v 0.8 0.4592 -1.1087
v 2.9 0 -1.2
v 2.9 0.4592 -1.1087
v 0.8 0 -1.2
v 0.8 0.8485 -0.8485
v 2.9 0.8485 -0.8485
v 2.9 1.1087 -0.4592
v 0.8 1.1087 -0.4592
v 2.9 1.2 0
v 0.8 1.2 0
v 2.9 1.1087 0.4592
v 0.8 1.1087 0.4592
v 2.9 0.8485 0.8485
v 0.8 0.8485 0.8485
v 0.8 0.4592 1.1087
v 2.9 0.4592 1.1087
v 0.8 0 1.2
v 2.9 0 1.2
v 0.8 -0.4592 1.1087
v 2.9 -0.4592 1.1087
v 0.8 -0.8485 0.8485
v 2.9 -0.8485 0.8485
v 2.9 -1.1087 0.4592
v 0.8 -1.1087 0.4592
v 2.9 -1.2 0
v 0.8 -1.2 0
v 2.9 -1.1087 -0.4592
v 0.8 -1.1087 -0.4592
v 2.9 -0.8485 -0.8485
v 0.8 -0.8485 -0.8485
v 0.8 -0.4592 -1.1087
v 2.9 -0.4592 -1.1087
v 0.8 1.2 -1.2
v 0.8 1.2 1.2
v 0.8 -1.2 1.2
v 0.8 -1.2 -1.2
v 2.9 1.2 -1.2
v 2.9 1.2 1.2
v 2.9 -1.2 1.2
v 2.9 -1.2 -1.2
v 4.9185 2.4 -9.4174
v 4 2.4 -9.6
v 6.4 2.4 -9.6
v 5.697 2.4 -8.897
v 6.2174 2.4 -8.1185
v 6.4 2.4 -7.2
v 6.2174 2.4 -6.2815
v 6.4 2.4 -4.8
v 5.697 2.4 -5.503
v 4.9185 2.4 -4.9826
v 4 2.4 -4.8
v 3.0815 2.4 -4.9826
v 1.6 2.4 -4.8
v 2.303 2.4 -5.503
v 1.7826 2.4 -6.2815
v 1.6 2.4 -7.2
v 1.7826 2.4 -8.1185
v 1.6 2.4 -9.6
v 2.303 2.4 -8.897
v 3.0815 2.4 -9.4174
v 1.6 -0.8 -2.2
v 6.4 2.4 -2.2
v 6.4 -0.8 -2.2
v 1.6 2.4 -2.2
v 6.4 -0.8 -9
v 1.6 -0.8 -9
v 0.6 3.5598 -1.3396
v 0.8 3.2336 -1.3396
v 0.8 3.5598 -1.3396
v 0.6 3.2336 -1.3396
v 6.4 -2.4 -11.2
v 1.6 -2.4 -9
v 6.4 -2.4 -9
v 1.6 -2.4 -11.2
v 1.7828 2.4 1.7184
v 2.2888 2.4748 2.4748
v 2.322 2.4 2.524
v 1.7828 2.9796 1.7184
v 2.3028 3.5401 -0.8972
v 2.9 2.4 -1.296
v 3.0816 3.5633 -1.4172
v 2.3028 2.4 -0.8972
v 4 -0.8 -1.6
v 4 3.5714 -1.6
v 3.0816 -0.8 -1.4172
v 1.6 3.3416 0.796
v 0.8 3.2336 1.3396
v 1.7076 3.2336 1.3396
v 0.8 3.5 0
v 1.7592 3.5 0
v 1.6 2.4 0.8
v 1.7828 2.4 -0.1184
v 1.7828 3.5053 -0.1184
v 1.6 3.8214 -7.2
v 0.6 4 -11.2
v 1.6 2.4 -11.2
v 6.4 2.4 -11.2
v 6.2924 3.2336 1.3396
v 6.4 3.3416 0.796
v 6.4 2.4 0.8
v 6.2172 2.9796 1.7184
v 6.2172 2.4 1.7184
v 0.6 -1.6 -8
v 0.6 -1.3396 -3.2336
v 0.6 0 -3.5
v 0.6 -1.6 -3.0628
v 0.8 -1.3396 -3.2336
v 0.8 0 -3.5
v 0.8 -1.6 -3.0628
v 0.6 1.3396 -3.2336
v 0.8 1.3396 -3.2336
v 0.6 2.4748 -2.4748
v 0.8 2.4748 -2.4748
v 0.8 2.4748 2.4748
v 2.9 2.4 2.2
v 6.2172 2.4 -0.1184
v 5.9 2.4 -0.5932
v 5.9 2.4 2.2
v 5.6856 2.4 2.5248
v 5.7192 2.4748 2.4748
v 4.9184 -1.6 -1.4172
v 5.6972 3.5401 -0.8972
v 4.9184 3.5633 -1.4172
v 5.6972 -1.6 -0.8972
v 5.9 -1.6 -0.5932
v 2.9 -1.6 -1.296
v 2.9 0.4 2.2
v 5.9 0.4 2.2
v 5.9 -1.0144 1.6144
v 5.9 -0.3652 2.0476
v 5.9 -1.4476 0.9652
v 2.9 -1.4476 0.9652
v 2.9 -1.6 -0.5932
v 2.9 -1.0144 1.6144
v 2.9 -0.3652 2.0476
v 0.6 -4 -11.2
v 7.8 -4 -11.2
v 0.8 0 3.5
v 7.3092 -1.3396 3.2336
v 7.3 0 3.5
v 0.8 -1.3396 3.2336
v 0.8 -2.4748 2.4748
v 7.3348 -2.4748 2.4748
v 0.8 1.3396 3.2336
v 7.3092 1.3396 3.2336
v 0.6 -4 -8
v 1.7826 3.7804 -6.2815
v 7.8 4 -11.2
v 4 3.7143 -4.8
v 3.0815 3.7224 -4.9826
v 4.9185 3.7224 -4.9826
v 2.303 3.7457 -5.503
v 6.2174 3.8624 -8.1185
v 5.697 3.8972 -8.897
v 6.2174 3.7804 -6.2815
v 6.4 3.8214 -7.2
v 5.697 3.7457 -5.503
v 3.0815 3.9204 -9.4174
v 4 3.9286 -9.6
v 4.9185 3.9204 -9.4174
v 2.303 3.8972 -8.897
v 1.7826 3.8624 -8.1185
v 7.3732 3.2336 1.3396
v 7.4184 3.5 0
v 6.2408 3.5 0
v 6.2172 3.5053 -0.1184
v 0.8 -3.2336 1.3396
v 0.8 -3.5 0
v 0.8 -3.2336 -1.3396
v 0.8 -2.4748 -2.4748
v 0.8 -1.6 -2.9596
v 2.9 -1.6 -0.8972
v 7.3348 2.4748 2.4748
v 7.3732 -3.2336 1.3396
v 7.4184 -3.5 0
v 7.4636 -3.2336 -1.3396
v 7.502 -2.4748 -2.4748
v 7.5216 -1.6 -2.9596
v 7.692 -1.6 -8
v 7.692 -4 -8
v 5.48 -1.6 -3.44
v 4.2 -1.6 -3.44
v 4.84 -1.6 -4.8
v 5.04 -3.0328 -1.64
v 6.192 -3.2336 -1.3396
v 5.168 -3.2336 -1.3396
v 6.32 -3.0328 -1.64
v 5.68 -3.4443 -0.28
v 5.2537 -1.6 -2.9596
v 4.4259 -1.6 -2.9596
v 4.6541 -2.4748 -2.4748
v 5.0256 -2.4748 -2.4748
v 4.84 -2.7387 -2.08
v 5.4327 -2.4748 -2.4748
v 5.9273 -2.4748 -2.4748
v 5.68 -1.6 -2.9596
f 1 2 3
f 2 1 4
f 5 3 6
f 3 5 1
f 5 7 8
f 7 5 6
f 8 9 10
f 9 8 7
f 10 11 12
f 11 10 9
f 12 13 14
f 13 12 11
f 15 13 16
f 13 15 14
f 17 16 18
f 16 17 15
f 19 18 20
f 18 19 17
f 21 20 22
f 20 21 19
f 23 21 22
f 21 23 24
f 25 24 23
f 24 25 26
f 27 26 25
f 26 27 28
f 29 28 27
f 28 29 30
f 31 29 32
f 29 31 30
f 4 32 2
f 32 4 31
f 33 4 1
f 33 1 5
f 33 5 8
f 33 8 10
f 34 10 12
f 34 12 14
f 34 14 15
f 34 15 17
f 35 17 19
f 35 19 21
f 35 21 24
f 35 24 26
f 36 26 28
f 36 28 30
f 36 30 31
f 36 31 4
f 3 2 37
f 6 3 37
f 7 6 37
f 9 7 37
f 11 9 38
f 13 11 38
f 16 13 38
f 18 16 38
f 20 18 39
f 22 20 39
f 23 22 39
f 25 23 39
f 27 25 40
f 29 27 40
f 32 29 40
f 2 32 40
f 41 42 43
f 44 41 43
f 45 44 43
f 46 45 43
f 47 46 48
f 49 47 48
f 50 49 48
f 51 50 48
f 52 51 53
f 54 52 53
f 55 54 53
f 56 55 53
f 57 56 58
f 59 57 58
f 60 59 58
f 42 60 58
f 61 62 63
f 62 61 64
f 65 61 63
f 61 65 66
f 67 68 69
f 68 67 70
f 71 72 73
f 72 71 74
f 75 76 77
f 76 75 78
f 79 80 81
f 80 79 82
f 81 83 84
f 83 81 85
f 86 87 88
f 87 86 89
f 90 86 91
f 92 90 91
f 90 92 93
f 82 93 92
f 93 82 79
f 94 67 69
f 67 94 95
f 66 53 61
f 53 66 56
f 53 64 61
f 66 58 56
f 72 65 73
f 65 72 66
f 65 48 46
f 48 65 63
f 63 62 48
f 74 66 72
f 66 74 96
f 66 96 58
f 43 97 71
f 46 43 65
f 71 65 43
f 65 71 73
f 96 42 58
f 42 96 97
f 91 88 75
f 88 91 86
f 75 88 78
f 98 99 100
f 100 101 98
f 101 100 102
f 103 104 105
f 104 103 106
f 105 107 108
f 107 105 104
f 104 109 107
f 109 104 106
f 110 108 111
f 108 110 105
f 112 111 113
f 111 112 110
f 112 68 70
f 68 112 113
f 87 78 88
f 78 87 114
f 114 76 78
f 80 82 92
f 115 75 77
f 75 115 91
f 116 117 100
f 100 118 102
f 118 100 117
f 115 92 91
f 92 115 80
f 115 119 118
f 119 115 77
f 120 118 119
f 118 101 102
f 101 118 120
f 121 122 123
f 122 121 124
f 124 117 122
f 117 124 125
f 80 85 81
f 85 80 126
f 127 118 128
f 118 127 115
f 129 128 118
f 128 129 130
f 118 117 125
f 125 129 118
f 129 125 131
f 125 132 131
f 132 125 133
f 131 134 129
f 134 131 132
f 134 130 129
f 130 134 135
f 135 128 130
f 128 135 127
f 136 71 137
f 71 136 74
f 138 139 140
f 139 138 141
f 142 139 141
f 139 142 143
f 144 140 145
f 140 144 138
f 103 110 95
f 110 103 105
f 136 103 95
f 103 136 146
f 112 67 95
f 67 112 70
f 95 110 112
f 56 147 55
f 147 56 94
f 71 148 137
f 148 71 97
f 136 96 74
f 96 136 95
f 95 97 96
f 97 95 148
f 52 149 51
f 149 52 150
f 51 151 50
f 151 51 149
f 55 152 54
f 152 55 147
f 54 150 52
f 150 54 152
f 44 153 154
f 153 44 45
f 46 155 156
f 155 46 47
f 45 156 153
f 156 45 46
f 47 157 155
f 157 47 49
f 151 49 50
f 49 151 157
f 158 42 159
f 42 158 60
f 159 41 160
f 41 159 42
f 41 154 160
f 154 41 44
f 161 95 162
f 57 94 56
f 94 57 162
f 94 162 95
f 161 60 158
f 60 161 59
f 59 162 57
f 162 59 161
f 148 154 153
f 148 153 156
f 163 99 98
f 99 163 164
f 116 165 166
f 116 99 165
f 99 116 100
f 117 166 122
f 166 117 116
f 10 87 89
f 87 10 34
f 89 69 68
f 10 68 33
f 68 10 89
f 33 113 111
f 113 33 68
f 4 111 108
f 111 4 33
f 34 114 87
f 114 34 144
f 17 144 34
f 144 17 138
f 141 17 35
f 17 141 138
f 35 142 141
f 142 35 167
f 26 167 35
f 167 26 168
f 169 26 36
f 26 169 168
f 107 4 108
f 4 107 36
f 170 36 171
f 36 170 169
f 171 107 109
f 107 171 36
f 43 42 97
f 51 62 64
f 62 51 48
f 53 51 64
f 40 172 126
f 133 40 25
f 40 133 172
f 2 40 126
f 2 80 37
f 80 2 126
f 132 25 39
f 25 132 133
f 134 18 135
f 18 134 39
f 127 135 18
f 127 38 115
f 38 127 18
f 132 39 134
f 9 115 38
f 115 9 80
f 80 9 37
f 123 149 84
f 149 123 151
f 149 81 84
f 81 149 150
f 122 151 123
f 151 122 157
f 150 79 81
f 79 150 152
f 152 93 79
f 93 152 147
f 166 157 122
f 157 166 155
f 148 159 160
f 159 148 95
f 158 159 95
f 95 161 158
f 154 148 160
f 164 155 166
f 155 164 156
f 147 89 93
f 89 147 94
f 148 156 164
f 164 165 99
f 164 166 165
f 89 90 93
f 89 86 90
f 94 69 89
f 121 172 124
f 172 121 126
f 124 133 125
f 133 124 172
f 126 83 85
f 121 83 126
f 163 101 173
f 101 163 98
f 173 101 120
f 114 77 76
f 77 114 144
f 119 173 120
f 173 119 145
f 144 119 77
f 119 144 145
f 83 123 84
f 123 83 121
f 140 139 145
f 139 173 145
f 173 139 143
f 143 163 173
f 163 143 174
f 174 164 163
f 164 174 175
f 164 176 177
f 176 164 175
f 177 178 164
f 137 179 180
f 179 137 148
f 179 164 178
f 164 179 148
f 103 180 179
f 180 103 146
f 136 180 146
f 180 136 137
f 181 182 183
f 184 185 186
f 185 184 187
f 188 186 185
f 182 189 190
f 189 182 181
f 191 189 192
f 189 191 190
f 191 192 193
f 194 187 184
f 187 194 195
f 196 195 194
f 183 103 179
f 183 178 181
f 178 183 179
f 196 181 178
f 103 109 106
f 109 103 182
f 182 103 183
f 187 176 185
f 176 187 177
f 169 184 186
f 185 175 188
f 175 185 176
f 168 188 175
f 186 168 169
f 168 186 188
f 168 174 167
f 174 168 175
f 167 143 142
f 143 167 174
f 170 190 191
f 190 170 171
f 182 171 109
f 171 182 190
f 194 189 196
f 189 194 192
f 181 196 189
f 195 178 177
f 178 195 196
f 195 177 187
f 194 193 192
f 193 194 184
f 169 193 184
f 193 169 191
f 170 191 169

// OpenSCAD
use <../lib.scad>
use <s/3817bs01.scad>
function ldraw_lib__3817bpba() = [
// 0 ~Minifig Leg Left with  2 Red Diamonds Pattern (Obsolete)
// 0 Name: 3817bpba.dat
// 0 Author: Magnus Forsberg [MagFors]
// 0 !LDRAW_ORG Part UPDATE 2023-03
// 0 !LICENSE Licensed under CC BY 4.0 : see CAreadme.txt
// 
// 0 !HELP Move down 12 units to align with hips
// 
// 0 BFC CERTIFY CCW
  [0,"BFC","CERTIFY"],
  [0,"BFC","CCW"],
// 
// 0 !CATEGORY Obsolete
// 0 !KEYWORDS 2006, Batman, bricklink 970d03pb01, Harley Quinn, set 7886
// 
// 0 !HISTORY 2013-12-23 [MagFors] Original design as 3817pba
// 0 !HISTORY 2020-06-14 [MagFors] Adapted to corrected geometry
// 0 !HISTORY 2020-12-29 [PTadmin] Official Update 2020-03
// 0 !HISTORY 2023-05-29 [Holly-Wood] Obsoleted due to bad geometry
// 0 !HISTORY 2023-06-24 [OrionP] Official Update 2023-03
// 
// 
// 1 16 0 0 0 1 0 0 0 1 0 0 0 1 s\3817bs01.dat
  [1,16,0,0,0,1,0,0,0,1,0,0,0,1, ldraw_lib__s__3817bs01()],
// 4 16 1.5 20 -4 1.5 20 -10 19.23 20 -10 19.23 20 -4
  [4,16,1.5,20,-4,1.5,20,-10,19.23,20,-10,19.23,20,-4],
// 4 16 1.5 20 -10 1.5 28 -10 19.5 28 -10 19.23 20 -10
  [4,16,1.5,20,-10,1.5,28,-10,19.5,28,-10,19.23,20,-10],
// 5 24 2 3.349 -8.084 18.659 3.349 -8.084 2 0 -8.75 2 6.187 -6.187
  [5,24,2,3.349,-8.084,18.659,3.349,-8.084,2,0,-8.75,2,6.187,-6.187],
// 5 24 2 6.187 -6.187 18.755 6.187 -6.187 2 7.399 -4 2 3.349 -8.084
  [5,24,2,6.187,-6.187,18.755,6.187,-6.187,2,7.399,-4,2,3.349,-8.084],
// 5 24 2 0 -8.75 18.546 0 -8.75 2 3.349 -8.084 2 -3.349 -8.084
  [5,24,2,0,-8.75,18.546,0,-8.75,2,3.349,-8.084,2,-3.349,-8.084],
// 5 24 2 -3.349 -8.084 18.433 -3.349 -8.084 2 0 -8.75 2 -6.187 -6.187
  [5,24,2,-3.349,-8.084,18.433,-3.349,-8.084,2,0,-8.75,2,-6.187,-6.187],
// 
// 0 // pattern
// 3 4 13.7 8.6 -4 10.5 8.6 -4 12.1 12 -4
  [3,4,13.7,8.6,-4,10.5,8.6,-4,12.1,12,-4],
// 4 4 12.92 3.349 -8.084 12.6 4.1 -7.582 15.8 4.1 -7.582 15.48 3.349 -8.084
  [4,4,12.92,3.349,-8.084,12.6,4.1,-7.582,15.8,4.1,-7.582,15.48,3.349,-8.084],
// 3 4 14.2 0.7 -8.6108 12.92 3.349 -8.084 15.48 3.349 -8.084
  [3,4,14.2,0.7,-8.6108,12.92,3.349,-8.084,15.48,3.349,-8.084],
// 4 4 10.5 8.6 -4 13.7 8.6 -4 13.1343 7.399 -4 11.0647 7.399 -4
  [4,4,10.5,8.6,-4,13.7,8.6,-4,13.1343,7.399,-4,11.0647,7.399,-4],
// 4 4 12.564 6.187 -6.187 11.6353 6.187 -6.187 11.0647 7.399 -4 13.1343 7.399 -4
  [4,4,12.564,6.187,-6.187,11.6353,6.187,-6.187,11.0647,7.399,-4,13.1343,7.399,-4],
// 3 4 11.6353 6.187 -6.187 12.564 6.187 -6.187 12.1 5.2 -6.8467
  [3,4,11.6353,6.187,-6.187,12.564,6.187,-6.187,12.1,5.2,-6.8467],
// 4 4 12.6 4.1 -7.582 13.5818 6.187 -6.187 14.8182 6.187 -6.187 15.8 4.1 -7.582
  [4,4,12.6,4.1,-7.582,13.5818,6.187,-6.187,14.8182,6.187,-6.187,15.8,4.1,-7.582],
// 3 4 14.2 7.399 -4 14.8182 6.187 -6.187 13.5818 6.187 -6.187
  [3,4,14.2,7.399,-4,14.8182,6.187,-6.187,13.5818,6.187,-6.187],
// 3 16 12.1 12 -4 1.5 20 -4 19.23 20 -4
  [3,16,12.1,12,-4,1.5,20,-4,19.23,20,-4],
// 4 16 18.804 7.399 -4 13.7 8.6 -4 12.1 12 -4 19.23 20 -4
  [4,16,18.804,7.399,-4,13.7,8.6,-4,12.1,12,-4,19.23,20,-4],
// 3 16 14.2 7.399 -4 13.7 8.6 -4 18.804 7.399 -4
  [3,16,14.2,7.399,-4,13.7,8.6,-4,18.804,7.399,-4],
// 4 16 10.5 8.6 -4 2 7.657 -4 1.5 7.657 -4 1.5 20 -4
  [4,16,10.5,8.6,-4,2,7.657,-4,1.5,7.657,-4,1.5,20,-4],
// 3 16 10.5 8.6 -4 1.5 20 -4 12.1 12 -4
  [3,16,10.5,8.6,-4,1.5,20,-4,12.1,12,-4],
// 4 16 18.755 6.187 -6.187 18.659 3.349 -8.084 15.48 3.349 -8.084 15.8 4.1 -7.582
  [4,16,18.755,6.187,-6.187,18.659,3.349,-8.084,15.48,3.349,-8.084,15.8,4.1,-7.582],
// 3 16 2 3.349 -8.084 12.6 4.1 -7.582 12.92 3.349 -8.084
  [3,16,2,3.349,-8.084,12.6,4.1,-7.582,12.92,3.349,-8.084],
// 4 16 14.2 0.7 -8.6108 15.48 3.349 -8.084 18.659 3.349 -8.084 18.546 0 -8.75
  [4,16,14.2,0.7,-8.6108,15.48,3.349,-8.084,18.659,3.349,-8.084,18.546,0,-8.75],
// 3 16 2 0 -8.75 14.2 0.7 -8.6108 18.546 0 -8.75
  [3,16,2,0,-8.75,14.2,0.7,-8.6108,18.546,0,-8.75],
// 4 16 2 0 -8.75 2 3.349 -8.084 12.92 3.349 -8.084 14.2 0.7 -8.6108
  [4,16,2,0,-8.75,2,3.349,-8.084,12.92,3.349,-8.084,14.2,0.7,-8.6108],
// 4 16 2 -3.349 -8.084 2 0 -8.75 18.546 0 -8.75 18.433 -3.349 -8.084
  [4,16,2,-3.349,-8.084,2,0,-8.75,18.546,0,-8.75,18.433,-3.349,-8.084],
// 4 16 2 -6.187 -6.187 2 -3.349 -8.084 18.433 -3.349 -8.084 18.337 -6.187 -6.187
  [4,16,2,-6.187,-6.187,2,-3.349,-8.084,18.433,-3.349,-8.084,18.337,-6.187,-6.187],
// 4 16 11.0647 7.399 -4 11.6353 6.187 -6.187 2 6.187 -6.187 2 7.399 -4
  [4,16,11.0647,7.399,-4,11.6353,6.187,-6.187,2,6.187,-6.187,2,7.399,-4],
// 4 16 10.5 8.6 -4 11.0647 7.399 -4 2 7.399 -4 2 7.657 -4
  [4,16,10.5,8.6,-4,11.0647,7.399,-4,2,7.399,-4,2,7.657,-4],
// 4 16 13.5818 6.187 -6.187 12.564 6.187 -6.187 13.1343 7.399 -4 14.2 7.399 -4
  [4,16,13.5818,6.187,-6.187,12.564,6.187,-6.187,13.1343,7.399,-4,14.2,7.399,-4],
// 3 16 13.7 8.6 -4 14.2 7.399 -4 13.1343 7.399 -4
  [3,16,13.7,8.6,-4,14.2,7.399,-4,13.1343,7.399,-4],
// 4 16 14.8182 6.187 -6.187 14.2 7.399 -4 18.804 7.399 -4 18.755 6.187 -6.187
  [4,16,14.8182,6.187,-6.187,14.2,7.399,-4,18.804,7.399,-4,18.755,6.187,-6.187],
// 3 16 14.8182 6.187 -6.187 18.755 6.187 -6.187 15.8 4.1 -7.582
  [3,16,14.8182,6.187,-6.187,18.755,6.187,-6.187,15.8,4.1,-7.582],
// 4 16 12.1 5.2 -6.8467 12.564 6.187 -6.187 13.5818 6.187 -6.187 12.6 4.1 -7.582
  [4,16,12.1,5.2,-6.8467,12.564,6.187,-6.187,13.5818,6.187,-6.187,12.6,4.1,-7.582],
// 4 16 11.6353 6.187 -6.187 12.1 5.2 -6.8467 12.6 4.1 -7.582 2 3.349 -8.084
  [4,16,11.6353,6.187,-6.187,12.1,5.2,-6.8467,12.6,4.1,-7.582,2,3.349,-8.084],
// 3 16 2 6.187 -6.187 11.6353 6.187 -6.187 2 3.349 -8.084
  [3,16,2,6.187,-6.187,11.6353,6.187,-6.187,2,3.349,-8.084],
];
module ldraw_lib__3817bpba(step=0, col=false, unit=2/5, alt=false, line=0.2, solid=!$preview)
    makepoly(ldraw_lib__3817bpba(), step=step, col=col, unit=unit, alt=alt, line=line, solid=solid);
ldraw_lib__3817bpba(line=0.2);
